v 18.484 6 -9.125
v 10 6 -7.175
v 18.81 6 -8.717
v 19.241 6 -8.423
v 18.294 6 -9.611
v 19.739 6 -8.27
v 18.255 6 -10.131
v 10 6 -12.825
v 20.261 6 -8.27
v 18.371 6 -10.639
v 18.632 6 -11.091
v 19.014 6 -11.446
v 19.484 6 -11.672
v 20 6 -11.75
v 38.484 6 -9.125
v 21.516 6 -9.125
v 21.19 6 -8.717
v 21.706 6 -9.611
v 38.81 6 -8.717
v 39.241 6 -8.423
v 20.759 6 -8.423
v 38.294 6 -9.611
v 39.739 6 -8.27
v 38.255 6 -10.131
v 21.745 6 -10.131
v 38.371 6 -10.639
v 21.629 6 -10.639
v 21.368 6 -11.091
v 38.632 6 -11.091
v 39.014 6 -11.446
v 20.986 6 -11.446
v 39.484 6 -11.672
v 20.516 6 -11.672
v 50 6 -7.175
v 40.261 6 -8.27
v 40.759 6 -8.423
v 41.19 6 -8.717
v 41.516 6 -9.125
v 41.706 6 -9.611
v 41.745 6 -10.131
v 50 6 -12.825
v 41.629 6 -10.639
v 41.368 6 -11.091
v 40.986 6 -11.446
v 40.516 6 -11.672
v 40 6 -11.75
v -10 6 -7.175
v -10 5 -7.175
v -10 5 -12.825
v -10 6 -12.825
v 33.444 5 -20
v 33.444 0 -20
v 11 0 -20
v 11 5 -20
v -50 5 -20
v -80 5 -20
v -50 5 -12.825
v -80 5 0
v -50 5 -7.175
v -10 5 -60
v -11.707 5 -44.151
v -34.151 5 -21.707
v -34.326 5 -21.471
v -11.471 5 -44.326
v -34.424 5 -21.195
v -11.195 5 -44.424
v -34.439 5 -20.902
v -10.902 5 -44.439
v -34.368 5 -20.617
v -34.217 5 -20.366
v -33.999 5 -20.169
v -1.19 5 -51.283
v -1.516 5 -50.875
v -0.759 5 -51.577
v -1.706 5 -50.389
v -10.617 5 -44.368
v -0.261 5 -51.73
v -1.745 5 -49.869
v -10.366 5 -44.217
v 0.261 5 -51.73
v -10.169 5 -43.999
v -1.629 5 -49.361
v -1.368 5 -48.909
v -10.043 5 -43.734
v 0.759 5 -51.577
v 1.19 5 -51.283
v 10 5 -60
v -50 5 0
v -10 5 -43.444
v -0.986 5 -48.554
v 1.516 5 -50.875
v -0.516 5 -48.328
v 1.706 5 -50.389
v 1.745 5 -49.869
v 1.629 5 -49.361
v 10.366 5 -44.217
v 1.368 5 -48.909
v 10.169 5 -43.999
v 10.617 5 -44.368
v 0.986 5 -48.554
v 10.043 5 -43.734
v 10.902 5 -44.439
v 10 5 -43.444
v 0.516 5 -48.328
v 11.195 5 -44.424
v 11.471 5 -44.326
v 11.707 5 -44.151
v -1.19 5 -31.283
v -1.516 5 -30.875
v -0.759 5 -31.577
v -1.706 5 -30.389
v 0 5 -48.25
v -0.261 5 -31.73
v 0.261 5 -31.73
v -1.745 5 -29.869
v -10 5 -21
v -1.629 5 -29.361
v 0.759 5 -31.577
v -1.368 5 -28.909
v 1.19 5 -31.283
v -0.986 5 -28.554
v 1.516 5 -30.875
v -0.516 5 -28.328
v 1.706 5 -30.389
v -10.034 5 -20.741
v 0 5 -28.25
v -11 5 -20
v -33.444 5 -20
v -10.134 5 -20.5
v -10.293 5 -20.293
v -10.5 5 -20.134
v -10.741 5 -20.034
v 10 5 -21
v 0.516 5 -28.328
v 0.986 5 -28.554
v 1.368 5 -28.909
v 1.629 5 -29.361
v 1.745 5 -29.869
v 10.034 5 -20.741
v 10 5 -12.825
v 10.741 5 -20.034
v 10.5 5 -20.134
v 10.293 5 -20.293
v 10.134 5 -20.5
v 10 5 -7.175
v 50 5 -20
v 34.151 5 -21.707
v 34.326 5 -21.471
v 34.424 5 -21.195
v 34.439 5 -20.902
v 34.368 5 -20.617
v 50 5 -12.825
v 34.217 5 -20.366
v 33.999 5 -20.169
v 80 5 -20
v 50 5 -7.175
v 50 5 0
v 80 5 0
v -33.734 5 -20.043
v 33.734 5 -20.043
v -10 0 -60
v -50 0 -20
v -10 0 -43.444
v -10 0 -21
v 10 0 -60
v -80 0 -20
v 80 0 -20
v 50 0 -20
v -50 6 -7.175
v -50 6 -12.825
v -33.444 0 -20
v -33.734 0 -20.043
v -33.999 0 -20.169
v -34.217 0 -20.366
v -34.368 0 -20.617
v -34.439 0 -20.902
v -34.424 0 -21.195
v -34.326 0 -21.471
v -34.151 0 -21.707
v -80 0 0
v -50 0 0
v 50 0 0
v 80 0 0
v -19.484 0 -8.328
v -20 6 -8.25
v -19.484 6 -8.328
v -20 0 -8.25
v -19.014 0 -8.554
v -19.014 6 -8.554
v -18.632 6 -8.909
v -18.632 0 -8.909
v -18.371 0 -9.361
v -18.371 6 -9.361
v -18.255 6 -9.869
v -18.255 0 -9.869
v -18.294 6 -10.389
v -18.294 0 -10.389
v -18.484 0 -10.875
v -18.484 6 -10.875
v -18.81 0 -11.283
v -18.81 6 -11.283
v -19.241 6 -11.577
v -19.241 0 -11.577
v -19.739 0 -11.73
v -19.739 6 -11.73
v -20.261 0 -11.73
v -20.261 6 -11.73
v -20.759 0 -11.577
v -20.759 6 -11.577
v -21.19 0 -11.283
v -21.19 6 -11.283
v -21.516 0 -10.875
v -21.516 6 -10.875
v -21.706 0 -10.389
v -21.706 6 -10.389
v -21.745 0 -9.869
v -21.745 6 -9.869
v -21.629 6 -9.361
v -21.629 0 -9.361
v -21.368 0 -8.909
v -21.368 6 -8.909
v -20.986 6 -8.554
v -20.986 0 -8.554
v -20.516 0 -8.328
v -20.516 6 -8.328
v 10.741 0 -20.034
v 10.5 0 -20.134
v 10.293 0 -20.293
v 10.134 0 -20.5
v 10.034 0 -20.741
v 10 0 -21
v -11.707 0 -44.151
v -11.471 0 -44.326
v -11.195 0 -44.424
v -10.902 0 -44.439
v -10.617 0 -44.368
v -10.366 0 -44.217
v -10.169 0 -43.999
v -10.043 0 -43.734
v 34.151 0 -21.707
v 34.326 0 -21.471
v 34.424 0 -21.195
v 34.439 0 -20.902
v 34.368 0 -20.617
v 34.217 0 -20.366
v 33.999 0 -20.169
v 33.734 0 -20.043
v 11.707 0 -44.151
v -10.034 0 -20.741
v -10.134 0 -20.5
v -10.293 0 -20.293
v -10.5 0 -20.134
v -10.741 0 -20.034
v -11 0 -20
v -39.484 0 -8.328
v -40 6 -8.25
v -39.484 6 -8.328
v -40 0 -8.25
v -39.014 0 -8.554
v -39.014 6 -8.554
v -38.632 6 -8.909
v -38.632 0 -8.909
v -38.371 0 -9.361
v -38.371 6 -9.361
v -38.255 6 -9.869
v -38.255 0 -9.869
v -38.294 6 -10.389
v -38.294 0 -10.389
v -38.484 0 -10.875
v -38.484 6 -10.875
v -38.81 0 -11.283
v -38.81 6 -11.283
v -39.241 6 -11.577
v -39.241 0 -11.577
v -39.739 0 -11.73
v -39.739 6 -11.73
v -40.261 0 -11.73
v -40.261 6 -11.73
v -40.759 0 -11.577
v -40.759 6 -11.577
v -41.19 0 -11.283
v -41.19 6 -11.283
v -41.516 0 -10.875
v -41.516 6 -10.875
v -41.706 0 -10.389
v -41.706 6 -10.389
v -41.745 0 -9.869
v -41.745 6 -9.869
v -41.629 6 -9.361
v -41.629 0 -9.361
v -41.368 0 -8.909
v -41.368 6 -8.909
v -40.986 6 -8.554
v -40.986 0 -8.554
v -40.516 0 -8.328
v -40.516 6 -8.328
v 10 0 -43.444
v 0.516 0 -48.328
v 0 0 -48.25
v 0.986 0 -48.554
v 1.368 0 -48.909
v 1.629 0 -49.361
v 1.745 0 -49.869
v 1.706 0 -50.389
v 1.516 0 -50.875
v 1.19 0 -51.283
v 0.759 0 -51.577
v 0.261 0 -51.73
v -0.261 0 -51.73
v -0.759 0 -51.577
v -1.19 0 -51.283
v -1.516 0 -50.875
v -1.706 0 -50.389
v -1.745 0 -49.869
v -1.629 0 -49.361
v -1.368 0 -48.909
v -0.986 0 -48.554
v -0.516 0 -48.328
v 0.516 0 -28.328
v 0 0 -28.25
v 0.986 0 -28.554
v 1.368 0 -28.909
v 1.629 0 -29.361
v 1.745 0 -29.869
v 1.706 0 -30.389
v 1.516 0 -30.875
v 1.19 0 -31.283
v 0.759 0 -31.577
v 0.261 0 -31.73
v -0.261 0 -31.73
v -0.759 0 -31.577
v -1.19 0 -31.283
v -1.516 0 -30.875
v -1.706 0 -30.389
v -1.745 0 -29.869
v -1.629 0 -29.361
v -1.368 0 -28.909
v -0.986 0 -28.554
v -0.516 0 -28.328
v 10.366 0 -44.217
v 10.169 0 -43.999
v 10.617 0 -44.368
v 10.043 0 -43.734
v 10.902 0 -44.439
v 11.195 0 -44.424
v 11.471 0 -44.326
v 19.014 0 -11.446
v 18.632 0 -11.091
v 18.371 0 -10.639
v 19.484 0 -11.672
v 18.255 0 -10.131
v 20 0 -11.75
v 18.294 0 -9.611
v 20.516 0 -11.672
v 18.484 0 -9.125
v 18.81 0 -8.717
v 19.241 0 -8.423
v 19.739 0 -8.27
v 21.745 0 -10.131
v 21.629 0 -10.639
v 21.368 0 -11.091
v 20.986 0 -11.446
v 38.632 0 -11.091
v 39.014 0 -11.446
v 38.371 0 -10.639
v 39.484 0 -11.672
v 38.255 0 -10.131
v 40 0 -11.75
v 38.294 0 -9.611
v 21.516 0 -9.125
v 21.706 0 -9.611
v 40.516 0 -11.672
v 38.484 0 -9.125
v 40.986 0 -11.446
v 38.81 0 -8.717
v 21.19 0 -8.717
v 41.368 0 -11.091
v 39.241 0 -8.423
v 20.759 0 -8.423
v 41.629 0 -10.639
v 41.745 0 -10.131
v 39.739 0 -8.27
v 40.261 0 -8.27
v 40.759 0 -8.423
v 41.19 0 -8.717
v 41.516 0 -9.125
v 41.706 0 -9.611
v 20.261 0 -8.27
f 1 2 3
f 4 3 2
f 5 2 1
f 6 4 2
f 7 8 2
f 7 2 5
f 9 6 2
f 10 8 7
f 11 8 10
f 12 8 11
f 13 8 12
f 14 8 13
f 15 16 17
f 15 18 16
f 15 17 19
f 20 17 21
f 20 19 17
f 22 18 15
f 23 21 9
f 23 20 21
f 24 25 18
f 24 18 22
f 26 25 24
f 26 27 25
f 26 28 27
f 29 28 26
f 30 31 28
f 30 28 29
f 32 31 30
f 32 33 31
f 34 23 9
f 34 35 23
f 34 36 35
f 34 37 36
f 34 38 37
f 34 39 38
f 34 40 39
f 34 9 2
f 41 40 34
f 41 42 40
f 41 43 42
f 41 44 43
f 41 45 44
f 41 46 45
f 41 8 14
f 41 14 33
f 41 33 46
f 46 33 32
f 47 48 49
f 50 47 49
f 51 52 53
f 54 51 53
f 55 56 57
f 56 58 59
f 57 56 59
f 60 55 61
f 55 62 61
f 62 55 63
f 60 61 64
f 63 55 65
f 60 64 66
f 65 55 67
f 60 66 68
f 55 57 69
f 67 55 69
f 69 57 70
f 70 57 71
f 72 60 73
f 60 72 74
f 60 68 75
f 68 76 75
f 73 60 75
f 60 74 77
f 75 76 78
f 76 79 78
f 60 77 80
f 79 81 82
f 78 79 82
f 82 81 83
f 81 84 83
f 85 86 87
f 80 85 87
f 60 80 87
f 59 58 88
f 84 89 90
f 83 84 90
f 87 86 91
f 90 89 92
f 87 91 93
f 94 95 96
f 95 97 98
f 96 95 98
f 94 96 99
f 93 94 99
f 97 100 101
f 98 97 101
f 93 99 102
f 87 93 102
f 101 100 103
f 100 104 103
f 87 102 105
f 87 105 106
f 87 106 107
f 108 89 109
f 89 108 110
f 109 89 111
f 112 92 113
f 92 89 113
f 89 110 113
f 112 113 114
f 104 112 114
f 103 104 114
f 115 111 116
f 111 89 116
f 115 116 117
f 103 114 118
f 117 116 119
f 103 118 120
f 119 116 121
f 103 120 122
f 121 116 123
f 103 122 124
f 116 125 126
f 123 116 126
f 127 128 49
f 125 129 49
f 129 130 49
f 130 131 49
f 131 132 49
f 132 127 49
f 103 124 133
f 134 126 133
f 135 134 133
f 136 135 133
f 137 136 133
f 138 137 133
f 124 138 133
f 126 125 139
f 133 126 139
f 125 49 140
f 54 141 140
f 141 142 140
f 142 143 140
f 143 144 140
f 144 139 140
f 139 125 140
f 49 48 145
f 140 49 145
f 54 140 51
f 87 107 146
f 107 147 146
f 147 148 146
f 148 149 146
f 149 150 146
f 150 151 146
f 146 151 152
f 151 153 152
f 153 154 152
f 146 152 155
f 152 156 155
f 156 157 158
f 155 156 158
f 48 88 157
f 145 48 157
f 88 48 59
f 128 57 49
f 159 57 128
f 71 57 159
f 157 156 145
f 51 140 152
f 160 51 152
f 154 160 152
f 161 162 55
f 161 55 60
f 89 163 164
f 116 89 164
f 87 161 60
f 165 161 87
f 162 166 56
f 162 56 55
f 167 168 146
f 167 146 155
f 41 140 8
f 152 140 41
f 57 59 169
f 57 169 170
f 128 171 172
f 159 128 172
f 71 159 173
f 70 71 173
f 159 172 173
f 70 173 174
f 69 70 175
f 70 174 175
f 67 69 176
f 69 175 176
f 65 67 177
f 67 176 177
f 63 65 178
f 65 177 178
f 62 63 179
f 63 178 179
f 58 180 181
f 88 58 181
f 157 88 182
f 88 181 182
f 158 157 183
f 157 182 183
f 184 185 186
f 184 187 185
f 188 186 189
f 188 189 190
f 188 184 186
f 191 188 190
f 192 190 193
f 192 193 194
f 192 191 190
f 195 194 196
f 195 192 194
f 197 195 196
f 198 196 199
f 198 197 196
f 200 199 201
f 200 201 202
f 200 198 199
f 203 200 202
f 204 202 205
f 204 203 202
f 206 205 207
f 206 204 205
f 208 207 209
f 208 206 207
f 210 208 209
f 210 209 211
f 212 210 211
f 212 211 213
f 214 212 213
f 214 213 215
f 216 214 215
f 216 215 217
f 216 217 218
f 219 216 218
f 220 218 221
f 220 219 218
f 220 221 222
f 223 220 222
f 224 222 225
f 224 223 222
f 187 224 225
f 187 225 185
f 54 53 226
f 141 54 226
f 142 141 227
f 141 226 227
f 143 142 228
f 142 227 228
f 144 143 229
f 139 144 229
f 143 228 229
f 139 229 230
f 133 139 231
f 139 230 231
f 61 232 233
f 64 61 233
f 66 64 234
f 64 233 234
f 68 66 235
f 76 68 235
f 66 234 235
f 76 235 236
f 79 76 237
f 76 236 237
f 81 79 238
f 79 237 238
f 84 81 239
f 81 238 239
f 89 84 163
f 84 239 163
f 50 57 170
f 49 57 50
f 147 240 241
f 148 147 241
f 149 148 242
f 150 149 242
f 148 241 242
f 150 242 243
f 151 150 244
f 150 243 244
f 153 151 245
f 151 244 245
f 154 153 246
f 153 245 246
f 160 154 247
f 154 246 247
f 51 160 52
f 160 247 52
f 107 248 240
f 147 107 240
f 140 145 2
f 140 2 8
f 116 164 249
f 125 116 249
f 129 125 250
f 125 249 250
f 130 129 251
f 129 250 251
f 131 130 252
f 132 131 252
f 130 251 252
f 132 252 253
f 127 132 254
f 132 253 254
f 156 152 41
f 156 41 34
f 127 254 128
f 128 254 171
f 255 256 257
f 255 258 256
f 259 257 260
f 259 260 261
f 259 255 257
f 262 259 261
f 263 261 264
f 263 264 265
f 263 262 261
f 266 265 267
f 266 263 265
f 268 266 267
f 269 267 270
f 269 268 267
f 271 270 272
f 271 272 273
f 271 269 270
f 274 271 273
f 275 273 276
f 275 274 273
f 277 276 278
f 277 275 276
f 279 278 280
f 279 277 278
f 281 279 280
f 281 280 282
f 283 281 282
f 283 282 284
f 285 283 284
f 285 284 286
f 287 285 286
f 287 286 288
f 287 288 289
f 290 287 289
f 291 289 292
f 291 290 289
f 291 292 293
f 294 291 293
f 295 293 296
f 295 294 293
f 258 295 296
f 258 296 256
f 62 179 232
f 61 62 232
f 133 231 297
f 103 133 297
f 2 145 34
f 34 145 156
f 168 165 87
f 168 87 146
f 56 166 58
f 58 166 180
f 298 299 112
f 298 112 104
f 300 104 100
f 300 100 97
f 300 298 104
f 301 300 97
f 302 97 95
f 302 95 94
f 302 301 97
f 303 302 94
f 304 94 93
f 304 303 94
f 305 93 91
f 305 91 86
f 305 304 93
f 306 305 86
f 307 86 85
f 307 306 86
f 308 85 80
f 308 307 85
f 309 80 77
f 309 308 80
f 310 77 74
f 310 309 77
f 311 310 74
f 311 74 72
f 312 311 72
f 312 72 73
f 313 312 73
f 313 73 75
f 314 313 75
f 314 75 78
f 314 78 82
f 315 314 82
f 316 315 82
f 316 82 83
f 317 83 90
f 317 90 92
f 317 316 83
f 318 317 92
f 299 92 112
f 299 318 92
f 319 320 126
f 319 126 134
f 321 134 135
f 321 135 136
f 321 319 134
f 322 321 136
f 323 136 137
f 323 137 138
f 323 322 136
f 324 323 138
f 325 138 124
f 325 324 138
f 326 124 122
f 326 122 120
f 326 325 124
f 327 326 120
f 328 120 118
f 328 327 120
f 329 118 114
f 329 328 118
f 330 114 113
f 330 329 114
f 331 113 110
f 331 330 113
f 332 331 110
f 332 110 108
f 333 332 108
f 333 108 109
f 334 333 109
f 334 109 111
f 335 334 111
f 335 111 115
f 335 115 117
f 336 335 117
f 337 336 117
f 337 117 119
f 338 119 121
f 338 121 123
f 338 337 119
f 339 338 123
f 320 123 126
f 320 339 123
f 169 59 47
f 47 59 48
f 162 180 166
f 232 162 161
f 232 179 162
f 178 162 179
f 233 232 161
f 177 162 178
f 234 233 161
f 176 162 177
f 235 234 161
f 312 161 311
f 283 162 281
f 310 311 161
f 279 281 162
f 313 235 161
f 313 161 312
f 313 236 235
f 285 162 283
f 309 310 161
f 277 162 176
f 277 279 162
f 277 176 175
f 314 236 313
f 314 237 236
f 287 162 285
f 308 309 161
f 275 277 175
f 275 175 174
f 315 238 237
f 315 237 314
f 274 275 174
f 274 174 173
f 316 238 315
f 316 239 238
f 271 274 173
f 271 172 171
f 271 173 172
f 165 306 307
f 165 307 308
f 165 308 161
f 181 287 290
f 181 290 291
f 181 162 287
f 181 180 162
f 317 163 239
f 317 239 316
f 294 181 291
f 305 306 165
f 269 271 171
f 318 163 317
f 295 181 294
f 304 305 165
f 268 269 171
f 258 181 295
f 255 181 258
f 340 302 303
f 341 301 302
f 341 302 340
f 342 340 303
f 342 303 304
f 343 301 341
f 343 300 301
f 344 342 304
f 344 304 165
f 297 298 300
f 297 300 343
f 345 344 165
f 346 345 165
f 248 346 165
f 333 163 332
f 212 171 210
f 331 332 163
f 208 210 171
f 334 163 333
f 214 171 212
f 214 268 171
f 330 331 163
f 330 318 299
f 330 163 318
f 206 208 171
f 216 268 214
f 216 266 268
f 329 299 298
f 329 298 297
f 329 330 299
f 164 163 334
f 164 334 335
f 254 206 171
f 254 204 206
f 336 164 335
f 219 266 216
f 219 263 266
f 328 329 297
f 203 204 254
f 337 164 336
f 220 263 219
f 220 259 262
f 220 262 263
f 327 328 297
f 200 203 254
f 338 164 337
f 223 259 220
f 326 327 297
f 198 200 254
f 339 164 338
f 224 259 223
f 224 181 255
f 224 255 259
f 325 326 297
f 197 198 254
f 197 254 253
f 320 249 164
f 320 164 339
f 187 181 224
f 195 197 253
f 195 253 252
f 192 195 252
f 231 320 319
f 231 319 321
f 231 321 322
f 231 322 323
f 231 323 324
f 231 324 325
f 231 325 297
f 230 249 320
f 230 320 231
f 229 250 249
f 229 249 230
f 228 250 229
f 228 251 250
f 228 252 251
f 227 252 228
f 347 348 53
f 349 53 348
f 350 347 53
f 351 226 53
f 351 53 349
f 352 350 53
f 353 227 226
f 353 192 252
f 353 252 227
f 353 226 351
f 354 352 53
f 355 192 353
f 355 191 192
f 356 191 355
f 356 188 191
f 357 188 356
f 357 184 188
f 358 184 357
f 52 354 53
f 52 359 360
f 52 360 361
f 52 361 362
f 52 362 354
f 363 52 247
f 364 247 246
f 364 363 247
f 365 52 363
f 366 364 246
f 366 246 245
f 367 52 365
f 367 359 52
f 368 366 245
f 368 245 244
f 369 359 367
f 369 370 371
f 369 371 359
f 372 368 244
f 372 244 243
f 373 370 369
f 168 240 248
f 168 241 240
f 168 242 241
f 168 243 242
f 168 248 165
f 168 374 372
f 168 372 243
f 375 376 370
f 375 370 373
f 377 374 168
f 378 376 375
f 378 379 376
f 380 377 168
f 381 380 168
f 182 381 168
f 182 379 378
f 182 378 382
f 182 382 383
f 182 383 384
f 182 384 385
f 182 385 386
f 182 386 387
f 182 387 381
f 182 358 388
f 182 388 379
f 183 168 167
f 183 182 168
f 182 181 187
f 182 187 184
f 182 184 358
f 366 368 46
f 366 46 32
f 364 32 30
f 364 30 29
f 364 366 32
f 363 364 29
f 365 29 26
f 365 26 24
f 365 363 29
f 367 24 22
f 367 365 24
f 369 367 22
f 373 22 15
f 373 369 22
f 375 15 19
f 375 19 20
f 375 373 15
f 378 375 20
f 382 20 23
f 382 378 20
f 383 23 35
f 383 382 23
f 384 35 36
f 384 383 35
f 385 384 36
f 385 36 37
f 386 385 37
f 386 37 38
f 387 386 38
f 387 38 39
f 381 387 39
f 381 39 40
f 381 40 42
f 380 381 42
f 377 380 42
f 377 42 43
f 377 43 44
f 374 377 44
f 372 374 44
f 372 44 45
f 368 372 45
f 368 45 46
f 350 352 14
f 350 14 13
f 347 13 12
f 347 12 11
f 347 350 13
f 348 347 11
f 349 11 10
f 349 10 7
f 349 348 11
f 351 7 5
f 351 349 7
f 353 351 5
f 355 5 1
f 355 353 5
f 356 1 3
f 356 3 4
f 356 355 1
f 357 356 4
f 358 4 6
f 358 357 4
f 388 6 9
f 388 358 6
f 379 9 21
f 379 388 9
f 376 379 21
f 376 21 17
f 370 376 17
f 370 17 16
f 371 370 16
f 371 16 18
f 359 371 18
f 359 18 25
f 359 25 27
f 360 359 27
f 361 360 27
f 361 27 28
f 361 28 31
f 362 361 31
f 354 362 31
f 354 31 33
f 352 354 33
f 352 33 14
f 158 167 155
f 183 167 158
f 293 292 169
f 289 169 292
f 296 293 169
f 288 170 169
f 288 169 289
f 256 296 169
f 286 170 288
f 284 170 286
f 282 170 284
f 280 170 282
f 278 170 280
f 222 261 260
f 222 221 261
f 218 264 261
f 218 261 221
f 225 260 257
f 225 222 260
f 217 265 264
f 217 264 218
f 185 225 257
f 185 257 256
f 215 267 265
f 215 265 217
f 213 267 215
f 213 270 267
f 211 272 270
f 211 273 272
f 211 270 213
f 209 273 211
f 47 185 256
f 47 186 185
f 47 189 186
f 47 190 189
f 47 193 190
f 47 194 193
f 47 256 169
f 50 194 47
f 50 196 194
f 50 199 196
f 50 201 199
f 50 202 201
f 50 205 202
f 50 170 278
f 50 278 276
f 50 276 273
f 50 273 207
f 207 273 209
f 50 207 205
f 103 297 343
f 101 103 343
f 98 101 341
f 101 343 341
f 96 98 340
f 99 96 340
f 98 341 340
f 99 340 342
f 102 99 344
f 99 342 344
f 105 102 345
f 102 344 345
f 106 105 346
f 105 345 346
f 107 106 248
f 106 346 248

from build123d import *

# Parameters (mm, degrees)
ESBO_O1_R                = 1.75
RESSALTO_EXTRUS_O1_DEPTH = 5
ESBO_O3_W                = 40
ESBO_O3_H                = 5.65
ESBO_O3_R                = 1.75
RESSALTO_EXTRUS_O2_DEPTH = 1
ESBO_O4_W                = 30
ESBO_O4_H                = 20.000002677
RESSALTO_EXTRUS_O3_DEPTH = 5


with BuildPart() as part:
    # Esboço1 → Ressalto-extrusão1 (new body)
    with BuildSketch(Plane(origin=(0, 0, 0), x_dir=(1, 0, 0), z_dir=(0, 1, 0))):
        Polygon((-50, 0), (-50, 20.000002677), (-9.999996661, 60.000002546), (9.999996661, 60.000002546), (50, 20.000002677), (50, 0), align=None)
        with Locations(Location((-40, 10.000001339, 0), (0, 0, 270))):
            Circle(ESBO_O1_R, mode=Mode.SUBTRACT)
        with Locations(Location((-20, 10.000001339, 0), (0, 0, 270))):
            Circle(ESBO_O1_R, mode=Mode.SUBTRACT)
        with Locations(Location((0, 50.000002546, 0), (0, 0, 270))):
            Circle(ESBO_O1_R, mode=Mode.SUBTRACT)
        with Locations(Location((0, 30.000002546, 0), (0, 0, 270))):
            Circle(ESBO_O1_R, mode=Mode.SUBTRACT)
        with Locations(Location((20, 10.000001339, 0), (0, 0, 90))):
            Circle(ESBO_O1_R, mode=Mode.SUBTRACT)
        with Locations(Location((40, 10.000001339, 0), (0, 0, 90))):
            Circle(ESBO_O1_R, mode=Mode.SUBTRACT)
        with BuildLine():
            Line((-10, 43.443650782), (-10, 21.000001339))
            ThreePointArc((-10, 21.000001339), (-10.292893219, 20.292894558), (-11, 20.000001339))
            Line((-11, 20.000001339), (-33.443651391, 20.000001339))
            ThreePointArc((-33.443651391, 20.000001339), (-34.367530932, 20.617317926), (-34.150758141, 21.707108151))
            Line((-34.150758141, 21.707108151), (-11.707106751, 44.150757594))
            ThreePointArc((-11.707106751, 44.150757594), (-10.617316548, 44.367530307), (-10, 43.443650782))
        make_face(mode=Mode.SUBTRACT)
        with BuildLine():
            Line((11.707106751, 44.150757594), (34.150758141, 21.707108151))
            ThreePointArc((34.150758141, 21.707108151), (34.367530932, 20.617317926), (33.443651391, 20.000001339))
            Line((33.443651391, 20.000001339), (11, 20.000001339))
            ThreePointArc((11, 20.000001339), (10.292893219, 20.292894558), (10, 21.000001339))
            Line((10, 21.000001339), (10, 43.443650782))
            ThreePointArc((10, 43.443650782), (10.617316548, 44.367530307), (11.707106751, 44.150757594))
        make_face(mode=Mode.SUBTRACT)
    extrude(amount=RESSALTO_EXTRUS_O1_DEPTH)

    # Esboço3 → Ressalto-extrusão2 (add)
    # profile 1 of 2: a face of its own
    with BuildSketch(Plane(origin=(0, 5, 0), x_dir=(1, 0, 0), z_dir=(0, 1, 0))):
        with Locations((-30, 10.000001339)):
            Rectangle(ESBO_O3_W, ESBO_O3_H)
        with Locations(Location((-40, 10.000001339, 0), (0, 0, 270))):
            Circle(ESBO_O3_R, mode=Mode.SUBTRACT)
        with Locations(Location((-20, 10.000001339, 0), (0, 0, 270))):
            Circle(ESBO_O3_R, mode=Mode.SUBTRACT)
    # profile 2 of 2: a face of its own
    with BuildSketch(Plane(origin=(0, 5, 0), x_dir=(1, 0, 0), z_dir=(0, 1, 0))):
        with Locations((30, 10.000001339)):
            Rectangle(ESBO_O3_W, ESBO_O3_H)
        with Locations(Location((20, 10.000001339, 0), (0, 0, 90))):
            Circle(ESBO_O3_R, mode=Mode.SUBTRACT)
        with Locations(Location((40, 10.000001339, 0), (0, 0, 90))):
            Circle(ESBO_O3_R, mode=Mode.SUBTRACT)
    extrude(amount=RESSALTO_EXTRUS_O2_DEPTH)

    # Esboço4 → Ressalto-extrusão3 (add)
    with BuildSketch(Plane.XZ):
        with Locations((-65, -10.000001339)):
            Rectangle(ESBO_O4_W, ESBO_O4_H)
        with Locations((65, -10.000001339)):
            Rectangle(ESBO_O4_W, ESBO_O4_H)
    extrude(amount=-RESSALTO_EXTRUS_O3_DEPTH)


solid = part.part
